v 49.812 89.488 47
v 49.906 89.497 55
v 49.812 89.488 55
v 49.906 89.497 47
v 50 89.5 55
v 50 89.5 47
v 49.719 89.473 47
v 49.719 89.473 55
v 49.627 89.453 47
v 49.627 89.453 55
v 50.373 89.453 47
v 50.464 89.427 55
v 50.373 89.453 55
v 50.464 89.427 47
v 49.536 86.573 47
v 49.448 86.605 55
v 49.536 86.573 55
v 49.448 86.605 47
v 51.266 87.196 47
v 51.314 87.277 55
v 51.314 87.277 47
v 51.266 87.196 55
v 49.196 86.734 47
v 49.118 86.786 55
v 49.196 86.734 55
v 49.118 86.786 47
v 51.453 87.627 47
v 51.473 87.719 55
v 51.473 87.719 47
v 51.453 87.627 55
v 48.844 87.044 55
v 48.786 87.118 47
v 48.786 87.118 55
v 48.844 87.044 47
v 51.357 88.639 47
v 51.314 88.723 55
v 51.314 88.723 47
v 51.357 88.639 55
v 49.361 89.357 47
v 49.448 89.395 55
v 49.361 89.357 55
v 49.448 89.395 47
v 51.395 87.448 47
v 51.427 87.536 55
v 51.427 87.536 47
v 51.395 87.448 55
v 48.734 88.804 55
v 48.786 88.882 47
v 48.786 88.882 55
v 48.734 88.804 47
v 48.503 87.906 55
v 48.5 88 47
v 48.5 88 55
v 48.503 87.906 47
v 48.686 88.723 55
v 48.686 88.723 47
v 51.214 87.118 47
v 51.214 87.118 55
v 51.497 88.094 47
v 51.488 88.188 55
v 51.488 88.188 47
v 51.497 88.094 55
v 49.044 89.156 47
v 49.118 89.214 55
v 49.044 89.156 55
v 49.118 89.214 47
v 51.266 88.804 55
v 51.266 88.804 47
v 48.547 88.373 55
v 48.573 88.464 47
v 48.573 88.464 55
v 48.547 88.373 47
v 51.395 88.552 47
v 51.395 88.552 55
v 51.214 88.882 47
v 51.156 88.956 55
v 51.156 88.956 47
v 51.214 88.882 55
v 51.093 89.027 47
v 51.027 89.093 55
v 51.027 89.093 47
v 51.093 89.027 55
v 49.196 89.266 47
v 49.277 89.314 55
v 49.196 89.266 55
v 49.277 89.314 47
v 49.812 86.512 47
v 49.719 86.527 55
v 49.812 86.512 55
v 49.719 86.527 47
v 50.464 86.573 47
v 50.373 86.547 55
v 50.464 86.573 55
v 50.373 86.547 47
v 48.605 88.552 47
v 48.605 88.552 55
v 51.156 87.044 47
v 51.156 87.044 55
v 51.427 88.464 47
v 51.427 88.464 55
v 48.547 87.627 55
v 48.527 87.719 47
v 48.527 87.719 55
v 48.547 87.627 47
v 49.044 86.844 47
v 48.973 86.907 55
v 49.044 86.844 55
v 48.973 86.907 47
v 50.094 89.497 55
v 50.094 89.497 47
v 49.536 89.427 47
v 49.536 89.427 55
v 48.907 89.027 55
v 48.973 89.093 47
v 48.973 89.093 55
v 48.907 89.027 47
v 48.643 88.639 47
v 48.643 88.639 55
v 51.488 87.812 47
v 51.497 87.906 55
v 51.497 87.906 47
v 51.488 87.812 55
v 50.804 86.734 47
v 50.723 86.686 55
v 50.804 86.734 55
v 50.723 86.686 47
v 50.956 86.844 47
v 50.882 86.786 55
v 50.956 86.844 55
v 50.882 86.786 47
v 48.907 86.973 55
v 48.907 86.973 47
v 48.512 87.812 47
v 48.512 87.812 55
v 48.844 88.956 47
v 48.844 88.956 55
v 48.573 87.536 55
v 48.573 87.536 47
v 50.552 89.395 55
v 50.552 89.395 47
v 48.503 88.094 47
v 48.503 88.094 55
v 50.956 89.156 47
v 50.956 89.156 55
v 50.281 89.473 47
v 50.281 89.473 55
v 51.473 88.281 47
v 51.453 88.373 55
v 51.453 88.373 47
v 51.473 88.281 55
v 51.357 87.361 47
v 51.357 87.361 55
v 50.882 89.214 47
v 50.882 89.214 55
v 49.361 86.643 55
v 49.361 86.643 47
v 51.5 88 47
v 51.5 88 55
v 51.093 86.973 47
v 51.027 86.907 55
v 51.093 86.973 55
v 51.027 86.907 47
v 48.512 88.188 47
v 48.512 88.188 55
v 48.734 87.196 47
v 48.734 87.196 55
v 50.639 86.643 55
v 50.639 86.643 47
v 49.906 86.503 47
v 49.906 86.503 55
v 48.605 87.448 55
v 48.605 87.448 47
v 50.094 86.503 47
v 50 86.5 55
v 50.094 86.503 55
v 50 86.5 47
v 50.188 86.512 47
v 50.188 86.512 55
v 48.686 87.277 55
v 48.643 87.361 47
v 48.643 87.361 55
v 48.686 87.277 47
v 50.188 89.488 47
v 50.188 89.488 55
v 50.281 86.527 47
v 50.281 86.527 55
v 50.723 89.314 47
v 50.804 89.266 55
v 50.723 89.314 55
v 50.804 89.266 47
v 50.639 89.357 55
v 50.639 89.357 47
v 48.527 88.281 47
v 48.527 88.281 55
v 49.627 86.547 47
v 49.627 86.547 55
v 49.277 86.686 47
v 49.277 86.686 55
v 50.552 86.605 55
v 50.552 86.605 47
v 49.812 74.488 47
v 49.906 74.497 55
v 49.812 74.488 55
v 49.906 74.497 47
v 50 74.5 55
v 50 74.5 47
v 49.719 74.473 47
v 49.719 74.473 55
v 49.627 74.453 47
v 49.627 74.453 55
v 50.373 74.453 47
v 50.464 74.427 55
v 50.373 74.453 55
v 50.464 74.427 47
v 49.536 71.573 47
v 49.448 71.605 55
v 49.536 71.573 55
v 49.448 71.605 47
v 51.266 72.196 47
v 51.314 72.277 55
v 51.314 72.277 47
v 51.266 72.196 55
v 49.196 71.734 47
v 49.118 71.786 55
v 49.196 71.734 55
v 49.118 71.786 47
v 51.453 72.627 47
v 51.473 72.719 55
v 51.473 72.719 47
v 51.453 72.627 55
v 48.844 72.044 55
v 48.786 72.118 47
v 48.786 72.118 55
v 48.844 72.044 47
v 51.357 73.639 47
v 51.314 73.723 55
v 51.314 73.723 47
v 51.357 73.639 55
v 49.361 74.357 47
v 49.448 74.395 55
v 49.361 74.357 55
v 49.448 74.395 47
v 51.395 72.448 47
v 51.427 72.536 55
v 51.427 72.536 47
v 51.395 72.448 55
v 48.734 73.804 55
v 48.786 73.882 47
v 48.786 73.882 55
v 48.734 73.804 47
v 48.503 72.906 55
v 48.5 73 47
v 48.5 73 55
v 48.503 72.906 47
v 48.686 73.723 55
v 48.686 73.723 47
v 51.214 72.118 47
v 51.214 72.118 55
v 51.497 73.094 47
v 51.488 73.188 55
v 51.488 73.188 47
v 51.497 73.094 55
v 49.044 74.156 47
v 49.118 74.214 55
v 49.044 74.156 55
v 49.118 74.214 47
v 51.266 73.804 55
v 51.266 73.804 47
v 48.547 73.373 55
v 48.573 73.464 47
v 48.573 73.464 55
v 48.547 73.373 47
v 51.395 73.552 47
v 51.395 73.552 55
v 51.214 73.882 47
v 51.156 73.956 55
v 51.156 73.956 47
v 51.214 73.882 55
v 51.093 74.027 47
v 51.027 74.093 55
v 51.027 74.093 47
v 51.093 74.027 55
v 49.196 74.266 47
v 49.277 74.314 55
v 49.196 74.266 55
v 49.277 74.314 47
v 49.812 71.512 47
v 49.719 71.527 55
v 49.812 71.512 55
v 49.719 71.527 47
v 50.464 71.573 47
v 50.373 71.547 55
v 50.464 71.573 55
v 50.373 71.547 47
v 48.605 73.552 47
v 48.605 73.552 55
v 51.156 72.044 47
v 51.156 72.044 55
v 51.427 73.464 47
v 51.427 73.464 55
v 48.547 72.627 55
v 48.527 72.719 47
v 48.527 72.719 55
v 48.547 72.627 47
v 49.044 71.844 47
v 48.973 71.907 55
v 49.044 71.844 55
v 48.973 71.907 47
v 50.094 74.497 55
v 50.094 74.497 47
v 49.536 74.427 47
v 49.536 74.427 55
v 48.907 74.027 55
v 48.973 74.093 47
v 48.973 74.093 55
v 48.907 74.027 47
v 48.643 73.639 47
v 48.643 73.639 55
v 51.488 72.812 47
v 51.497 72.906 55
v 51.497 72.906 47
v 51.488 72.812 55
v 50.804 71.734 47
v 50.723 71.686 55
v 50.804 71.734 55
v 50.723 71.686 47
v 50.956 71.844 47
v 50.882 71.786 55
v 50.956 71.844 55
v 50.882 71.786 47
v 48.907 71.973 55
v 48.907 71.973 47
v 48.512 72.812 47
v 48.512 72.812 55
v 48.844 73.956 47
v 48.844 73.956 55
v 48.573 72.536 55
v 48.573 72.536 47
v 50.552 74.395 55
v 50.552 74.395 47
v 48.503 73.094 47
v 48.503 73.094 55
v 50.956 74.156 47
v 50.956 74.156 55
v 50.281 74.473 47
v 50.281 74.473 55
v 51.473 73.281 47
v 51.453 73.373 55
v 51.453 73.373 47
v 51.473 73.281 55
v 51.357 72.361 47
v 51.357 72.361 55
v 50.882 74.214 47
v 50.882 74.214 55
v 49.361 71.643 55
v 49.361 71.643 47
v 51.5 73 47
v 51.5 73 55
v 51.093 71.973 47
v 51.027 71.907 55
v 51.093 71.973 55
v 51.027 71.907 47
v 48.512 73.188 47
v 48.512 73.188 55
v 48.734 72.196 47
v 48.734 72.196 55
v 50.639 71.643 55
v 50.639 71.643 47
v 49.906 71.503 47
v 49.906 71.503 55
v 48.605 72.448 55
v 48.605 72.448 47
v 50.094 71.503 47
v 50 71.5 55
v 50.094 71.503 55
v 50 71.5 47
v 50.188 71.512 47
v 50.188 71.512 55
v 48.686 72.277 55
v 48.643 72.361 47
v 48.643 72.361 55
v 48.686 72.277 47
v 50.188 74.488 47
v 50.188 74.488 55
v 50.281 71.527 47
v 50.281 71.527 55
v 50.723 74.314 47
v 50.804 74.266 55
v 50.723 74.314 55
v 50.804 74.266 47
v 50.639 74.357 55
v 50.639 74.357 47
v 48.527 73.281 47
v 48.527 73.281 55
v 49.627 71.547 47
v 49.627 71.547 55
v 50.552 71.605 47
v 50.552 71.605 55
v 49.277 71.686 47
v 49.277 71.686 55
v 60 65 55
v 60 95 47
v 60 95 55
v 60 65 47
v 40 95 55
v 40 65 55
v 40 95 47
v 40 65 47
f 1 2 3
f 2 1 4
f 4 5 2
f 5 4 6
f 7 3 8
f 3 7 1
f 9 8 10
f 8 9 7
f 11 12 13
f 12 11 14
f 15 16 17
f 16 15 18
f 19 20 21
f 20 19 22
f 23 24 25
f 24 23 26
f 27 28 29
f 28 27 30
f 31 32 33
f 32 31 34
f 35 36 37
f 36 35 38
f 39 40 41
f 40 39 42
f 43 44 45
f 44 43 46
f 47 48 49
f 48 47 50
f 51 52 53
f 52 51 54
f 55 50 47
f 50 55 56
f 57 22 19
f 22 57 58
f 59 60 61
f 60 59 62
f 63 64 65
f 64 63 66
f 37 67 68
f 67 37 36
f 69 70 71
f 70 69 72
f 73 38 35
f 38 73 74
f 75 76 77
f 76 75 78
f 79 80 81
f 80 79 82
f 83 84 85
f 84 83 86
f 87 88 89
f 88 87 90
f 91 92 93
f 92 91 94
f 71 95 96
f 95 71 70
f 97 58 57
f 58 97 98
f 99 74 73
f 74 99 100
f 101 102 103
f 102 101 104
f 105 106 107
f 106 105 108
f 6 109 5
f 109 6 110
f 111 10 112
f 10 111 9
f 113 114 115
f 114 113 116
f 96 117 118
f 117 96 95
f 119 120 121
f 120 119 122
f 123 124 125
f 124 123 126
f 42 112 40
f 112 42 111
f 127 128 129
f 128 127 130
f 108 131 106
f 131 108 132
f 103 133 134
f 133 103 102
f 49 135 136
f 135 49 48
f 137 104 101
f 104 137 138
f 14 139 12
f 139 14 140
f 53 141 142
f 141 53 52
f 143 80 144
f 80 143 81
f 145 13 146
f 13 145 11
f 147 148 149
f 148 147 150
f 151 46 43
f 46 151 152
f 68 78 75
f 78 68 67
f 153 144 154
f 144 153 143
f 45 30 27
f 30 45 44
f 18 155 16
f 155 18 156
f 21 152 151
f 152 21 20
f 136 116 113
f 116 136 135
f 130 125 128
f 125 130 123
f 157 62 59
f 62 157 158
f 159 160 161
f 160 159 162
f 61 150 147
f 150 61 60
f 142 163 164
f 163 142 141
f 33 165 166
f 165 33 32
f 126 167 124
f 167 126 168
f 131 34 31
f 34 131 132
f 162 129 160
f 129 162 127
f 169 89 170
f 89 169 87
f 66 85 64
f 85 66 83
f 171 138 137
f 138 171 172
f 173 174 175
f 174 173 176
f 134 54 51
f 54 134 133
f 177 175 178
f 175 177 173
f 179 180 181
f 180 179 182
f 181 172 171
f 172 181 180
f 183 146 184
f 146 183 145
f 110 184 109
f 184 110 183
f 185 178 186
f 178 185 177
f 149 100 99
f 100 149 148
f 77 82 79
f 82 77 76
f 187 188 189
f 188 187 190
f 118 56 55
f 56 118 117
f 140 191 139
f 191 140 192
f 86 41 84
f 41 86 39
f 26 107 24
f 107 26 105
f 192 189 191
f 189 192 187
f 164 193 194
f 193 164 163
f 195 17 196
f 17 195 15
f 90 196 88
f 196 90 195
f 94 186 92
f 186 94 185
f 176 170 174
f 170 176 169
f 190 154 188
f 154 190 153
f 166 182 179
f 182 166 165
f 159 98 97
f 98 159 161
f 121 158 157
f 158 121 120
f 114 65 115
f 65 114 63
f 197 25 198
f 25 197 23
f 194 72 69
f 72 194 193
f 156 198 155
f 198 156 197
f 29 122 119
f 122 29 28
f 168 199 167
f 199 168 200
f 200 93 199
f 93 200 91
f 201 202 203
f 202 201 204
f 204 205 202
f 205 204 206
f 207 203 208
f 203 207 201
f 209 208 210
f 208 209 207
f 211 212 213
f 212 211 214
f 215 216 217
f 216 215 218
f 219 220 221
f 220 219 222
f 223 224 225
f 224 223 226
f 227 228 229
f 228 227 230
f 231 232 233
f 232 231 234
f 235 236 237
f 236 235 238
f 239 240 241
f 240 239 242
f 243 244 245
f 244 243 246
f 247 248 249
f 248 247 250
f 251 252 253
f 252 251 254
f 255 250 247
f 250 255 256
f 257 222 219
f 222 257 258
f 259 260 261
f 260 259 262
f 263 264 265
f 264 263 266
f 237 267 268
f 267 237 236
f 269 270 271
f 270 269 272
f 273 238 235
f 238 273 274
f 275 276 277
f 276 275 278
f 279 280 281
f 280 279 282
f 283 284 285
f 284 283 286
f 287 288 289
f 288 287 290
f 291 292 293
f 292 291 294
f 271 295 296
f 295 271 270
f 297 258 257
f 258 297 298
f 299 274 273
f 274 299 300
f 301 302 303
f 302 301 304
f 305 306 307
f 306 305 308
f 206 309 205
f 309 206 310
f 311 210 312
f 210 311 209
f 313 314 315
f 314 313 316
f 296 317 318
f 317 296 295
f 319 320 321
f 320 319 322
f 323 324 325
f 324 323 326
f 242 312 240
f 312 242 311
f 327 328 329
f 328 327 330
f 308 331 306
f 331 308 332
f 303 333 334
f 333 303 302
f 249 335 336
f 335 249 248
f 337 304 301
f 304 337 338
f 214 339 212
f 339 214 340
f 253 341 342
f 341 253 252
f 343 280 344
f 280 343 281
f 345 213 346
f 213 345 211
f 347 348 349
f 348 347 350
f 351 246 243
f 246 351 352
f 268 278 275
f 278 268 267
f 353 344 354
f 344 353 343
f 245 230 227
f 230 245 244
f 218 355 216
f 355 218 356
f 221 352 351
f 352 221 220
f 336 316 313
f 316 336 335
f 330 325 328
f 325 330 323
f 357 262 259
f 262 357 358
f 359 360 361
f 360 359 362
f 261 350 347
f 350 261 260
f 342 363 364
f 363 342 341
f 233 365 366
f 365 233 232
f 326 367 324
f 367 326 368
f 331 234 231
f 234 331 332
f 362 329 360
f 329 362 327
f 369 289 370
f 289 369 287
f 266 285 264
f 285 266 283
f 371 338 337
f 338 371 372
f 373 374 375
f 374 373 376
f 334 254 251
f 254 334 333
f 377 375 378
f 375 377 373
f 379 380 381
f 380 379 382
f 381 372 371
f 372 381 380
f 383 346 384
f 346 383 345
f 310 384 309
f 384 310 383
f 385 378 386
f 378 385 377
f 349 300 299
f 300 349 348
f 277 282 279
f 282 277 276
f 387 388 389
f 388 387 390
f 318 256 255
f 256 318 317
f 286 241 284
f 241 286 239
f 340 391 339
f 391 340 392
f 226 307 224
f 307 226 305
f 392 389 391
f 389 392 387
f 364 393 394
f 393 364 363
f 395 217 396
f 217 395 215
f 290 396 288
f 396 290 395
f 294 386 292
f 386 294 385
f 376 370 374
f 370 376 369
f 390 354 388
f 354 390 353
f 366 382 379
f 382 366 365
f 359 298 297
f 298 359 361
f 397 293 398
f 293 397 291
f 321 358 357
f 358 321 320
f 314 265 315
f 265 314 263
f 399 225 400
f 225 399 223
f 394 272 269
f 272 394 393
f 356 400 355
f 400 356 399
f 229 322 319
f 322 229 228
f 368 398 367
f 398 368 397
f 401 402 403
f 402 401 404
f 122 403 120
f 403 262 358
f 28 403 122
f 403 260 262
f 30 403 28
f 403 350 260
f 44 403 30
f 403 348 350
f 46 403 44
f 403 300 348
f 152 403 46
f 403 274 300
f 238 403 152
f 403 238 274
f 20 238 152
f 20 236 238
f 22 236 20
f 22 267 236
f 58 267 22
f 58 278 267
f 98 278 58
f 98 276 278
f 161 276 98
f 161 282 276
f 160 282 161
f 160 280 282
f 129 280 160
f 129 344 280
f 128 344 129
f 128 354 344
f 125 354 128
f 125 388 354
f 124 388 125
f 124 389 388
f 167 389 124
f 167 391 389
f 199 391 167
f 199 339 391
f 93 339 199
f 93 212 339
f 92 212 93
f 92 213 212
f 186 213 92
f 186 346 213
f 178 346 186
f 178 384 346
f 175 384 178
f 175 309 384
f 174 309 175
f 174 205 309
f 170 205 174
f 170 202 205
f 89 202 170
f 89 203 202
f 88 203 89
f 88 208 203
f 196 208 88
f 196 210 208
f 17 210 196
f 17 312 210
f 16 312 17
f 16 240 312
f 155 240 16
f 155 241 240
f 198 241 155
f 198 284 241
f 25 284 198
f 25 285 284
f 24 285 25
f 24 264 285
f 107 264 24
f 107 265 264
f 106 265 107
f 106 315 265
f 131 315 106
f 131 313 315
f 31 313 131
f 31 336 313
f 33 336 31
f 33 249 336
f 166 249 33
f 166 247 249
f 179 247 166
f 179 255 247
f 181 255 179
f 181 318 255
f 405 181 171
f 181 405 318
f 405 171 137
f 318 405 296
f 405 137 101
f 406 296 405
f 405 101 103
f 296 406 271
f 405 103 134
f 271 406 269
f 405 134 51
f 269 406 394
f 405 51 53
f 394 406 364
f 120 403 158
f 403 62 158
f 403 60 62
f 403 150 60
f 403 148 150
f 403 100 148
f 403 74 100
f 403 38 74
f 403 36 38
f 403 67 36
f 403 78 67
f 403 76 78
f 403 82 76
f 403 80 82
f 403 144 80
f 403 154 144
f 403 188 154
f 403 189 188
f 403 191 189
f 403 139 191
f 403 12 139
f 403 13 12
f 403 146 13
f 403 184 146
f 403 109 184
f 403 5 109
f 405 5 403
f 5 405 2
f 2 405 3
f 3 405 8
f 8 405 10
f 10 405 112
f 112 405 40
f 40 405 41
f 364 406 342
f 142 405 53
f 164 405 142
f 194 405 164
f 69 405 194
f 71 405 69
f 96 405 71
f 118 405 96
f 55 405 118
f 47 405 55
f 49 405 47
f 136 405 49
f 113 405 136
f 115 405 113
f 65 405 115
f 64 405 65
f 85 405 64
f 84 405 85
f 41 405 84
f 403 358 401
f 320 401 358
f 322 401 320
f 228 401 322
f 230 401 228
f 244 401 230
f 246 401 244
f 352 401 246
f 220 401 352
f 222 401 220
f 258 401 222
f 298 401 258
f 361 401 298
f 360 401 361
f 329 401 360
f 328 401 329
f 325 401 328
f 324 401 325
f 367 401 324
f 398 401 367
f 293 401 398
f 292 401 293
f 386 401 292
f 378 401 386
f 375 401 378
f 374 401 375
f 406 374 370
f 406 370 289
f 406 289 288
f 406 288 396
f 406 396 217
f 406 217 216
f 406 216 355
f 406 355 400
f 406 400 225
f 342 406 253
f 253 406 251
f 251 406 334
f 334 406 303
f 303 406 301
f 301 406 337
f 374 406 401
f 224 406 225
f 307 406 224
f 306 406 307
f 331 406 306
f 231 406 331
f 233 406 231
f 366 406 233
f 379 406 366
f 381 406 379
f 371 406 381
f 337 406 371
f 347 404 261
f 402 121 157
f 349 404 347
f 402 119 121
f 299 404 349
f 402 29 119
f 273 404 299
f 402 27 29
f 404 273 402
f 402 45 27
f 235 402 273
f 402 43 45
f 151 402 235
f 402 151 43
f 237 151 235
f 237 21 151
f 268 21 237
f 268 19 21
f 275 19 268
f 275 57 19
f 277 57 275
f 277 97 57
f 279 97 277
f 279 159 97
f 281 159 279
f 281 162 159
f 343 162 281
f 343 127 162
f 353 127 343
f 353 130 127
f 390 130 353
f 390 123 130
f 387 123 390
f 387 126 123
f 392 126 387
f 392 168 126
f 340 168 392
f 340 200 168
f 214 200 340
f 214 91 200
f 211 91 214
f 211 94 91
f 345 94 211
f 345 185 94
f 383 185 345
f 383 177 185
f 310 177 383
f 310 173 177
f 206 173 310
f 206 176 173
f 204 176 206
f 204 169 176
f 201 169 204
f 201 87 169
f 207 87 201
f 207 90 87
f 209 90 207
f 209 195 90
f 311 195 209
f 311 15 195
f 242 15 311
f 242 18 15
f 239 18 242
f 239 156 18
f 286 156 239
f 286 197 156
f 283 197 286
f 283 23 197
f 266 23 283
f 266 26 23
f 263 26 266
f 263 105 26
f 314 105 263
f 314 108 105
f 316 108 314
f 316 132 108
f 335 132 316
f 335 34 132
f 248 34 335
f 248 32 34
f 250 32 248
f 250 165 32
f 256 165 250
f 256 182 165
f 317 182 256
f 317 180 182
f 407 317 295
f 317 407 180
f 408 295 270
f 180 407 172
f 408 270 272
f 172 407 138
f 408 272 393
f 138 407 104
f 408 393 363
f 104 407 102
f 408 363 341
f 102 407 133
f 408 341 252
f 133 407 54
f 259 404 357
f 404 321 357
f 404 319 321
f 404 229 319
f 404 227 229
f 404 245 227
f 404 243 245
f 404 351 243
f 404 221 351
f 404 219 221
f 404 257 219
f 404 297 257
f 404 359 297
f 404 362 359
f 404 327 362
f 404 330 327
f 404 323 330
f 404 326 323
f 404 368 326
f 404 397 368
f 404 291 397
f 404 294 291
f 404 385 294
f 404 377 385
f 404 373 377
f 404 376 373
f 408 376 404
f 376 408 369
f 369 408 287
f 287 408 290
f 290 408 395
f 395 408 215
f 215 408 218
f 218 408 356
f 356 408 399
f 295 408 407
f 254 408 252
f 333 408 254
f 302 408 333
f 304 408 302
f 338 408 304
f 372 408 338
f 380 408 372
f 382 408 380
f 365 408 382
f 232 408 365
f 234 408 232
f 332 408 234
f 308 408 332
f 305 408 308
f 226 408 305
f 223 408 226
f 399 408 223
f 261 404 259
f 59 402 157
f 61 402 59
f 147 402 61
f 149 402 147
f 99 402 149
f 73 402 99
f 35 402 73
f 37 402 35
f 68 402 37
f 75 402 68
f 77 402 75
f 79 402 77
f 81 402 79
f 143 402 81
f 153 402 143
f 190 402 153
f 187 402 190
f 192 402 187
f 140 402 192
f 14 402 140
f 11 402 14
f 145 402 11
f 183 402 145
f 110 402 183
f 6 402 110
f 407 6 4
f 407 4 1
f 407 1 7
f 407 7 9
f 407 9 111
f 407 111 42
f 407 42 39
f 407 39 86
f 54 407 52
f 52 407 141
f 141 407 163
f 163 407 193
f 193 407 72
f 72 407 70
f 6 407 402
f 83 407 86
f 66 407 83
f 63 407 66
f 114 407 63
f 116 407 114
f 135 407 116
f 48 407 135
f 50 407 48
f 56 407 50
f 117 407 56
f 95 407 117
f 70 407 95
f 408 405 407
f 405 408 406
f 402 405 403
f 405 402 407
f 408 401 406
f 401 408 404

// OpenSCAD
difference(){
	union(){

       translate([40,65,55-8]){
           cube([20,30,8], center=false);
       }


	}
	union() {
       translate([50,60-7+35,-10]){
            rotate(a = [0,0,90]) {
              cylinder(h=100, r=1.5, $fn=100, center=false);
            }
       }	
       translate([50,60-7+20,-10]){
            rotate(a = [0,0,90]) {
              cylinder(h=100, r=1.5, $fn=100, center=false);
            }
       }	



        
	}
}
